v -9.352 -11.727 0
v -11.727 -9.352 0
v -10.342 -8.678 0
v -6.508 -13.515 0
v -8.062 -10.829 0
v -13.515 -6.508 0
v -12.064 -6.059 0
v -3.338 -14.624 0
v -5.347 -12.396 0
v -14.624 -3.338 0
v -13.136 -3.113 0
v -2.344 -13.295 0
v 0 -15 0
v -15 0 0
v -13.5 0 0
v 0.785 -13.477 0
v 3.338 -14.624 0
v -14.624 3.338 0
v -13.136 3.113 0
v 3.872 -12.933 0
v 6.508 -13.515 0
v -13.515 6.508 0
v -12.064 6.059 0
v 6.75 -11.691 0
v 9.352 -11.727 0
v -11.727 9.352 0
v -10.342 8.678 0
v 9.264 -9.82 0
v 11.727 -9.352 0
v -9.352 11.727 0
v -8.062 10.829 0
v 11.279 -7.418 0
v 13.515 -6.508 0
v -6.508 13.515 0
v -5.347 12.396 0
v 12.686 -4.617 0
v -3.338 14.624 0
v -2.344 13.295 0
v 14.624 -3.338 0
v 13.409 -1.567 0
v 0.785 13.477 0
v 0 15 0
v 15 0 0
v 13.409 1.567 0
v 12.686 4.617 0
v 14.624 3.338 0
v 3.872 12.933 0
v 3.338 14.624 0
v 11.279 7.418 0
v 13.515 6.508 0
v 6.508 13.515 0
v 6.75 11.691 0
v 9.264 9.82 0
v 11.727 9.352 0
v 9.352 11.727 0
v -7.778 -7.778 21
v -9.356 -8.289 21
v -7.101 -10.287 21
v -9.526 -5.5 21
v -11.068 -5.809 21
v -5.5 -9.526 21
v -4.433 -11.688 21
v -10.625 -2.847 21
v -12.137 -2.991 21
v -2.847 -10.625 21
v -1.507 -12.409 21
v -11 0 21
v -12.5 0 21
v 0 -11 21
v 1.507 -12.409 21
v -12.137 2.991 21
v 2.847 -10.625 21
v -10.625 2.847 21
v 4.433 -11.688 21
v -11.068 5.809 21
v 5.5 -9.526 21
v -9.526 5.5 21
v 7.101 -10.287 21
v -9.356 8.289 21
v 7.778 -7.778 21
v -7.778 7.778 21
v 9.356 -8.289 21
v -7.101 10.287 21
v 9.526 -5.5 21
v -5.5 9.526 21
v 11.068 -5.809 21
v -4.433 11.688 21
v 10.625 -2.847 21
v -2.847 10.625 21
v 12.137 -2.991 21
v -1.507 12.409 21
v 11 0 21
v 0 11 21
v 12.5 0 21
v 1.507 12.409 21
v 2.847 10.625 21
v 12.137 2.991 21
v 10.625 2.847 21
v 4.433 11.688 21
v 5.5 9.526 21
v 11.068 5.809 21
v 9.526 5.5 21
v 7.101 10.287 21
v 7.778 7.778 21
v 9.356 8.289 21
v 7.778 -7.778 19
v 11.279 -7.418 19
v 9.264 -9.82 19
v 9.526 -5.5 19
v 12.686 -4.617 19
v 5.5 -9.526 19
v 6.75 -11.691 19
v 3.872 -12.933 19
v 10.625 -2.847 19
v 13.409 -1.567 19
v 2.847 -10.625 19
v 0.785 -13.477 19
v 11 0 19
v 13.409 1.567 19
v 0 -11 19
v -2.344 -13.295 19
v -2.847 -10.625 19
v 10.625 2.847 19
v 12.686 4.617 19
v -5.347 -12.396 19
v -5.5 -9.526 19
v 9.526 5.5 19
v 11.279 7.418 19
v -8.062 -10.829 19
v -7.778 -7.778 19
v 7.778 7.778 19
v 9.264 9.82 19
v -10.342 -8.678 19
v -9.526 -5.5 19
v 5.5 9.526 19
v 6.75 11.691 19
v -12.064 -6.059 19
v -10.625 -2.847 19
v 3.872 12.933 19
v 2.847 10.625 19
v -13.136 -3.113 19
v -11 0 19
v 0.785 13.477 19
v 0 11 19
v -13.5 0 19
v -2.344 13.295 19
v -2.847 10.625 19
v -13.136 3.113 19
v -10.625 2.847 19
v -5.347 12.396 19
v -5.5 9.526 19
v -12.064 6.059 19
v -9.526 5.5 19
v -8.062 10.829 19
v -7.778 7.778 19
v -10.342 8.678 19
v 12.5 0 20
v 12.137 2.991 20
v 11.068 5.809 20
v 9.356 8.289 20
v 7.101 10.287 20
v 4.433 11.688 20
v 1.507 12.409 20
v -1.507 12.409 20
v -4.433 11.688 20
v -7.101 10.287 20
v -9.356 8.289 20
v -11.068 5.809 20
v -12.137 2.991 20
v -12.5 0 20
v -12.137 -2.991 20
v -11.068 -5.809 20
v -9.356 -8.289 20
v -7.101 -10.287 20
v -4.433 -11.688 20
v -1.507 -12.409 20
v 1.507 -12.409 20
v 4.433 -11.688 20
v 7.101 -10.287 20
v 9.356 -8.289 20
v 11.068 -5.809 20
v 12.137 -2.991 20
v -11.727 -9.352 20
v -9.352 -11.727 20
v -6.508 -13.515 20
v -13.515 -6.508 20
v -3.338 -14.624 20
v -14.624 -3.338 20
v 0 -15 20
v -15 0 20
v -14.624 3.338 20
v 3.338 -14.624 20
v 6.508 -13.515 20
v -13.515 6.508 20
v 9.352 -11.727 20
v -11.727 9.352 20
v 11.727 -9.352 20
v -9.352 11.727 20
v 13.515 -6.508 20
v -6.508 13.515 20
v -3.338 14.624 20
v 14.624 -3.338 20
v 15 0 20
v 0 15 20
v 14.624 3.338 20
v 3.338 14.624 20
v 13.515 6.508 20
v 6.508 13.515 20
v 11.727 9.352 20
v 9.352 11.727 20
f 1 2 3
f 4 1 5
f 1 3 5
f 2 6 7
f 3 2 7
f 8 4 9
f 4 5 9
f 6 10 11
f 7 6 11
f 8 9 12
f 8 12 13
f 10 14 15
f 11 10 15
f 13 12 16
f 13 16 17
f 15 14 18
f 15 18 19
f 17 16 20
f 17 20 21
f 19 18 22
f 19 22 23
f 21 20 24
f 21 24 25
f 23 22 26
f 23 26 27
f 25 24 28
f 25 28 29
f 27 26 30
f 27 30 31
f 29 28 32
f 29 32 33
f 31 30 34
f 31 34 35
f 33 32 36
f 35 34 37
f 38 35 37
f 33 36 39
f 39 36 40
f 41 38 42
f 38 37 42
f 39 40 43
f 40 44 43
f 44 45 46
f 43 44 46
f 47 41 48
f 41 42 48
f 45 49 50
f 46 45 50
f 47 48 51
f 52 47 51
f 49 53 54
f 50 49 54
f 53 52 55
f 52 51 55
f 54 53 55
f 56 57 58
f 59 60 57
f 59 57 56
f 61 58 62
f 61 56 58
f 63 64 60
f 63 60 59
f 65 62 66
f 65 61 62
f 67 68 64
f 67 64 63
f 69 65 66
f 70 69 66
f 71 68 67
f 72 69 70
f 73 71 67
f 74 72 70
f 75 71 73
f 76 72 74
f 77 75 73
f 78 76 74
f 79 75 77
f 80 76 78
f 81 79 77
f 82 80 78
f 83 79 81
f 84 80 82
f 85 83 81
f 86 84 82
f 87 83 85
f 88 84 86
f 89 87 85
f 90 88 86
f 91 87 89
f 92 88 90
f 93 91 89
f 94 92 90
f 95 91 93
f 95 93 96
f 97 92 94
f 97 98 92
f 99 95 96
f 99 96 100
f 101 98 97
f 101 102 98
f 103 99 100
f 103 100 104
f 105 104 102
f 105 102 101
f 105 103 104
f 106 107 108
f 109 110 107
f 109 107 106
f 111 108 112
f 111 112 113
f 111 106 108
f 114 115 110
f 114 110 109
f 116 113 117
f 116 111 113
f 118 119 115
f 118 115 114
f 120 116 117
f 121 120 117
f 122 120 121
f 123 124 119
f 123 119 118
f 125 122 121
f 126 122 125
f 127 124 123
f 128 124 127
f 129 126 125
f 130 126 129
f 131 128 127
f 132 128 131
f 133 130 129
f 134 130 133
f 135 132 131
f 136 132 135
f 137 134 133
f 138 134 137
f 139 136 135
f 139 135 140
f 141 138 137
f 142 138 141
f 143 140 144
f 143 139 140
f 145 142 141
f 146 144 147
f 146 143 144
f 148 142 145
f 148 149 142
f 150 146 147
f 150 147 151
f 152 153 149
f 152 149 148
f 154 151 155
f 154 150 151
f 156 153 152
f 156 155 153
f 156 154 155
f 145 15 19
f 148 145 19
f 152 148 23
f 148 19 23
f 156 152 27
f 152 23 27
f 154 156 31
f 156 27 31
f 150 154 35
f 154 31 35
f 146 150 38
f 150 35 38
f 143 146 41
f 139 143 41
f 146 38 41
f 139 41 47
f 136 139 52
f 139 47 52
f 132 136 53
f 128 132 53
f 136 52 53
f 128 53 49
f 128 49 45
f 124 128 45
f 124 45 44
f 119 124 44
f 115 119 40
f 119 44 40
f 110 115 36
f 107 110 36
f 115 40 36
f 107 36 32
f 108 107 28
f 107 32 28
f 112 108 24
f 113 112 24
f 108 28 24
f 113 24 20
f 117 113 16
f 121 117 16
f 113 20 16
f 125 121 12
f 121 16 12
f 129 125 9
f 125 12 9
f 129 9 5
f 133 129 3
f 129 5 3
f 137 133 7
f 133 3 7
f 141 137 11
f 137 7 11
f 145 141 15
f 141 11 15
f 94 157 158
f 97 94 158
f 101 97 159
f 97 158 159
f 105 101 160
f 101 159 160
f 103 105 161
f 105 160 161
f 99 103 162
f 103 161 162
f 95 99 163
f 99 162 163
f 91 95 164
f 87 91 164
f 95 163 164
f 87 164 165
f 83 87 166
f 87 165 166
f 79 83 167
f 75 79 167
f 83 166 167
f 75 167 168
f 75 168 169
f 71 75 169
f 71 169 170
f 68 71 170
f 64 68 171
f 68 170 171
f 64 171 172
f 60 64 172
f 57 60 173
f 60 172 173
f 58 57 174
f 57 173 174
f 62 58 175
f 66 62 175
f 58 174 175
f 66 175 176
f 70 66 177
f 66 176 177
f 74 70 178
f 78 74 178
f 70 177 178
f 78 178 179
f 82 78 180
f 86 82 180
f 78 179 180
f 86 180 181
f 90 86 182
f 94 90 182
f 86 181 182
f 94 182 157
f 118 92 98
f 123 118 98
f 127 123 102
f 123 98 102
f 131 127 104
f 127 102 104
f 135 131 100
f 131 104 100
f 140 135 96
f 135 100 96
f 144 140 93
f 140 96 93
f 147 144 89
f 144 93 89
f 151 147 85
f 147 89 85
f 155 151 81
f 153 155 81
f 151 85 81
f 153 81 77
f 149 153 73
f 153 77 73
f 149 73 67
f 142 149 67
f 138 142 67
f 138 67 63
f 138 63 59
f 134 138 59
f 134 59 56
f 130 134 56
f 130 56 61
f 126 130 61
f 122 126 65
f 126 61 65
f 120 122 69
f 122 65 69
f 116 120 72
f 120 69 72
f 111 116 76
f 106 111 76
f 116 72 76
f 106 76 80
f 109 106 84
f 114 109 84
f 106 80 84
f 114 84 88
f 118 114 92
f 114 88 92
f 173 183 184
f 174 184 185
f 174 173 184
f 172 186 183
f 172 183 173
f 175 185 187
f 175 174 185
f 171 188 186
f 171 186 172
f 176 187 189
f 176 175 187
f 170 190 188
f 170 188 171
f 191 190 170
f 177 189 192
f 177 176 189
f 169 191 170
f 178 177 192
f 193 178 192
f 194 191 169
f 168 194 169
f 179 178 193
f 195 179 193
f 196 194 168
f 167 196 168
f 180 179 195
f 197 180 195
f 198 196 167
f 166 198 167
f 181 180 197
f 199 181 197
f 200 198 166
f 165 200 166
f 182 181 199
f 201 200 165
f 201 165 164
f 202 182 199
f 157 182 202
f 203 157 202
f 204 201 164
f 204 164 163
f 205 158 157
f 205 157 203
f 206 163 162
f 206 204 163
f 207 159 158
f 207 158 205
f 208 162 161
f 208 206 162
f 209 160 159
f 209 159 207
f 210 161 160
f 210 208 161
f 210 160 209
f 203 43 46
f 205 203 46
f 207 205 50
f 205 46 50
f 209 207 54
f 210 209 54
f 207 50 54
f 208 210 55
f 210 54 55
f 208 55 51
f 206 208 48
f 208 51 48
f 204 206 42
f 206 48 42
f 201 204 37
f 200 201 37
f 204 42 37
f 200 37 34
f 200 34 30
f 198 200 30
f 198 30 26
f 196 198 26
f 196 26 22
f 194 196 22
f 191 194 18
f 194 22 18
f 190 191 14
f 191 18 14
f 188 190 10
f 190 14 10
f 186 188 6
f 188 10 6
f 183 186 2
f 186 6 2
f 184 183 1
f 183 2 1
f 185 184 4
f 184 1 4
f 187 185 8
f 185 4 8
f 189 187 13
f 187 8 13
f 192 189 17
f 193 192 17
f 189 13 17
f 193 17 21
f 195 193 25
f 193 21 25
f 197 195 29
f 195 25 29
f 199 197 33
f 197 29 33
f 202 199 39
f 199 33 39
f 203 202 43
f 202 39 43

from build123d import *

# Parameters (mm, degrees)
ESQUISSE1_R             = 15
BOSS_EXTRU_1_DEPTH      = 20
ESQUISSE3_R             = 13.5
ENL_V_MAT_EXTRU_2_DEPTH = 19
ESQUISSE4_R             = 12.5
BOSS_EXTRU_2_DEPTH      = 1
ESQUISSE5_R             = 11
ENL_V_MAT_EXTRU_3_DEPTH = 2


with BuildPart() as part:
    # Esquisse1 → Boss.-Extru.1 (new body)
    with BuildSketch(Plane.XY):
        Circle(ESQUISSE1_R)
    extrude(amount=BOSS_EXTRU_1_DEPTH)

    # Esquisse3 → Enlèv. mat.-Extru.2 (cut)
    with BuildSketch(Plane(origin=(0, 0, 0), x_dir=(-1, 0, 0), z_dir=(0, 0, -1))):
        Circle(ESQUISSE3_R)
    extrude(amount=-ENL_V_MAT_EXTRU_2_DEPTH, mode=Mode.SUBTRACT)

    # Esquisse4 → Boss.-Extru.2 (add)
    with BuildSketch(Plane.XY.offset(20)):
        Circle(ESQUISSE4_R)
    extrude(amount=BOSS_EXTRU_2_DEPTH)

    # Esquisse5 → Enlèv. mat.-Extru.3 (cut)
    with BuildSketch(Plane.XY.offset(21)):
        Circle(ESQUISSE5_R)
    extrude(amount=-ENL_V_MAT_EXTRU_3_DEPTH, mode=Mode.SUBTRACT)


solid = part.part
